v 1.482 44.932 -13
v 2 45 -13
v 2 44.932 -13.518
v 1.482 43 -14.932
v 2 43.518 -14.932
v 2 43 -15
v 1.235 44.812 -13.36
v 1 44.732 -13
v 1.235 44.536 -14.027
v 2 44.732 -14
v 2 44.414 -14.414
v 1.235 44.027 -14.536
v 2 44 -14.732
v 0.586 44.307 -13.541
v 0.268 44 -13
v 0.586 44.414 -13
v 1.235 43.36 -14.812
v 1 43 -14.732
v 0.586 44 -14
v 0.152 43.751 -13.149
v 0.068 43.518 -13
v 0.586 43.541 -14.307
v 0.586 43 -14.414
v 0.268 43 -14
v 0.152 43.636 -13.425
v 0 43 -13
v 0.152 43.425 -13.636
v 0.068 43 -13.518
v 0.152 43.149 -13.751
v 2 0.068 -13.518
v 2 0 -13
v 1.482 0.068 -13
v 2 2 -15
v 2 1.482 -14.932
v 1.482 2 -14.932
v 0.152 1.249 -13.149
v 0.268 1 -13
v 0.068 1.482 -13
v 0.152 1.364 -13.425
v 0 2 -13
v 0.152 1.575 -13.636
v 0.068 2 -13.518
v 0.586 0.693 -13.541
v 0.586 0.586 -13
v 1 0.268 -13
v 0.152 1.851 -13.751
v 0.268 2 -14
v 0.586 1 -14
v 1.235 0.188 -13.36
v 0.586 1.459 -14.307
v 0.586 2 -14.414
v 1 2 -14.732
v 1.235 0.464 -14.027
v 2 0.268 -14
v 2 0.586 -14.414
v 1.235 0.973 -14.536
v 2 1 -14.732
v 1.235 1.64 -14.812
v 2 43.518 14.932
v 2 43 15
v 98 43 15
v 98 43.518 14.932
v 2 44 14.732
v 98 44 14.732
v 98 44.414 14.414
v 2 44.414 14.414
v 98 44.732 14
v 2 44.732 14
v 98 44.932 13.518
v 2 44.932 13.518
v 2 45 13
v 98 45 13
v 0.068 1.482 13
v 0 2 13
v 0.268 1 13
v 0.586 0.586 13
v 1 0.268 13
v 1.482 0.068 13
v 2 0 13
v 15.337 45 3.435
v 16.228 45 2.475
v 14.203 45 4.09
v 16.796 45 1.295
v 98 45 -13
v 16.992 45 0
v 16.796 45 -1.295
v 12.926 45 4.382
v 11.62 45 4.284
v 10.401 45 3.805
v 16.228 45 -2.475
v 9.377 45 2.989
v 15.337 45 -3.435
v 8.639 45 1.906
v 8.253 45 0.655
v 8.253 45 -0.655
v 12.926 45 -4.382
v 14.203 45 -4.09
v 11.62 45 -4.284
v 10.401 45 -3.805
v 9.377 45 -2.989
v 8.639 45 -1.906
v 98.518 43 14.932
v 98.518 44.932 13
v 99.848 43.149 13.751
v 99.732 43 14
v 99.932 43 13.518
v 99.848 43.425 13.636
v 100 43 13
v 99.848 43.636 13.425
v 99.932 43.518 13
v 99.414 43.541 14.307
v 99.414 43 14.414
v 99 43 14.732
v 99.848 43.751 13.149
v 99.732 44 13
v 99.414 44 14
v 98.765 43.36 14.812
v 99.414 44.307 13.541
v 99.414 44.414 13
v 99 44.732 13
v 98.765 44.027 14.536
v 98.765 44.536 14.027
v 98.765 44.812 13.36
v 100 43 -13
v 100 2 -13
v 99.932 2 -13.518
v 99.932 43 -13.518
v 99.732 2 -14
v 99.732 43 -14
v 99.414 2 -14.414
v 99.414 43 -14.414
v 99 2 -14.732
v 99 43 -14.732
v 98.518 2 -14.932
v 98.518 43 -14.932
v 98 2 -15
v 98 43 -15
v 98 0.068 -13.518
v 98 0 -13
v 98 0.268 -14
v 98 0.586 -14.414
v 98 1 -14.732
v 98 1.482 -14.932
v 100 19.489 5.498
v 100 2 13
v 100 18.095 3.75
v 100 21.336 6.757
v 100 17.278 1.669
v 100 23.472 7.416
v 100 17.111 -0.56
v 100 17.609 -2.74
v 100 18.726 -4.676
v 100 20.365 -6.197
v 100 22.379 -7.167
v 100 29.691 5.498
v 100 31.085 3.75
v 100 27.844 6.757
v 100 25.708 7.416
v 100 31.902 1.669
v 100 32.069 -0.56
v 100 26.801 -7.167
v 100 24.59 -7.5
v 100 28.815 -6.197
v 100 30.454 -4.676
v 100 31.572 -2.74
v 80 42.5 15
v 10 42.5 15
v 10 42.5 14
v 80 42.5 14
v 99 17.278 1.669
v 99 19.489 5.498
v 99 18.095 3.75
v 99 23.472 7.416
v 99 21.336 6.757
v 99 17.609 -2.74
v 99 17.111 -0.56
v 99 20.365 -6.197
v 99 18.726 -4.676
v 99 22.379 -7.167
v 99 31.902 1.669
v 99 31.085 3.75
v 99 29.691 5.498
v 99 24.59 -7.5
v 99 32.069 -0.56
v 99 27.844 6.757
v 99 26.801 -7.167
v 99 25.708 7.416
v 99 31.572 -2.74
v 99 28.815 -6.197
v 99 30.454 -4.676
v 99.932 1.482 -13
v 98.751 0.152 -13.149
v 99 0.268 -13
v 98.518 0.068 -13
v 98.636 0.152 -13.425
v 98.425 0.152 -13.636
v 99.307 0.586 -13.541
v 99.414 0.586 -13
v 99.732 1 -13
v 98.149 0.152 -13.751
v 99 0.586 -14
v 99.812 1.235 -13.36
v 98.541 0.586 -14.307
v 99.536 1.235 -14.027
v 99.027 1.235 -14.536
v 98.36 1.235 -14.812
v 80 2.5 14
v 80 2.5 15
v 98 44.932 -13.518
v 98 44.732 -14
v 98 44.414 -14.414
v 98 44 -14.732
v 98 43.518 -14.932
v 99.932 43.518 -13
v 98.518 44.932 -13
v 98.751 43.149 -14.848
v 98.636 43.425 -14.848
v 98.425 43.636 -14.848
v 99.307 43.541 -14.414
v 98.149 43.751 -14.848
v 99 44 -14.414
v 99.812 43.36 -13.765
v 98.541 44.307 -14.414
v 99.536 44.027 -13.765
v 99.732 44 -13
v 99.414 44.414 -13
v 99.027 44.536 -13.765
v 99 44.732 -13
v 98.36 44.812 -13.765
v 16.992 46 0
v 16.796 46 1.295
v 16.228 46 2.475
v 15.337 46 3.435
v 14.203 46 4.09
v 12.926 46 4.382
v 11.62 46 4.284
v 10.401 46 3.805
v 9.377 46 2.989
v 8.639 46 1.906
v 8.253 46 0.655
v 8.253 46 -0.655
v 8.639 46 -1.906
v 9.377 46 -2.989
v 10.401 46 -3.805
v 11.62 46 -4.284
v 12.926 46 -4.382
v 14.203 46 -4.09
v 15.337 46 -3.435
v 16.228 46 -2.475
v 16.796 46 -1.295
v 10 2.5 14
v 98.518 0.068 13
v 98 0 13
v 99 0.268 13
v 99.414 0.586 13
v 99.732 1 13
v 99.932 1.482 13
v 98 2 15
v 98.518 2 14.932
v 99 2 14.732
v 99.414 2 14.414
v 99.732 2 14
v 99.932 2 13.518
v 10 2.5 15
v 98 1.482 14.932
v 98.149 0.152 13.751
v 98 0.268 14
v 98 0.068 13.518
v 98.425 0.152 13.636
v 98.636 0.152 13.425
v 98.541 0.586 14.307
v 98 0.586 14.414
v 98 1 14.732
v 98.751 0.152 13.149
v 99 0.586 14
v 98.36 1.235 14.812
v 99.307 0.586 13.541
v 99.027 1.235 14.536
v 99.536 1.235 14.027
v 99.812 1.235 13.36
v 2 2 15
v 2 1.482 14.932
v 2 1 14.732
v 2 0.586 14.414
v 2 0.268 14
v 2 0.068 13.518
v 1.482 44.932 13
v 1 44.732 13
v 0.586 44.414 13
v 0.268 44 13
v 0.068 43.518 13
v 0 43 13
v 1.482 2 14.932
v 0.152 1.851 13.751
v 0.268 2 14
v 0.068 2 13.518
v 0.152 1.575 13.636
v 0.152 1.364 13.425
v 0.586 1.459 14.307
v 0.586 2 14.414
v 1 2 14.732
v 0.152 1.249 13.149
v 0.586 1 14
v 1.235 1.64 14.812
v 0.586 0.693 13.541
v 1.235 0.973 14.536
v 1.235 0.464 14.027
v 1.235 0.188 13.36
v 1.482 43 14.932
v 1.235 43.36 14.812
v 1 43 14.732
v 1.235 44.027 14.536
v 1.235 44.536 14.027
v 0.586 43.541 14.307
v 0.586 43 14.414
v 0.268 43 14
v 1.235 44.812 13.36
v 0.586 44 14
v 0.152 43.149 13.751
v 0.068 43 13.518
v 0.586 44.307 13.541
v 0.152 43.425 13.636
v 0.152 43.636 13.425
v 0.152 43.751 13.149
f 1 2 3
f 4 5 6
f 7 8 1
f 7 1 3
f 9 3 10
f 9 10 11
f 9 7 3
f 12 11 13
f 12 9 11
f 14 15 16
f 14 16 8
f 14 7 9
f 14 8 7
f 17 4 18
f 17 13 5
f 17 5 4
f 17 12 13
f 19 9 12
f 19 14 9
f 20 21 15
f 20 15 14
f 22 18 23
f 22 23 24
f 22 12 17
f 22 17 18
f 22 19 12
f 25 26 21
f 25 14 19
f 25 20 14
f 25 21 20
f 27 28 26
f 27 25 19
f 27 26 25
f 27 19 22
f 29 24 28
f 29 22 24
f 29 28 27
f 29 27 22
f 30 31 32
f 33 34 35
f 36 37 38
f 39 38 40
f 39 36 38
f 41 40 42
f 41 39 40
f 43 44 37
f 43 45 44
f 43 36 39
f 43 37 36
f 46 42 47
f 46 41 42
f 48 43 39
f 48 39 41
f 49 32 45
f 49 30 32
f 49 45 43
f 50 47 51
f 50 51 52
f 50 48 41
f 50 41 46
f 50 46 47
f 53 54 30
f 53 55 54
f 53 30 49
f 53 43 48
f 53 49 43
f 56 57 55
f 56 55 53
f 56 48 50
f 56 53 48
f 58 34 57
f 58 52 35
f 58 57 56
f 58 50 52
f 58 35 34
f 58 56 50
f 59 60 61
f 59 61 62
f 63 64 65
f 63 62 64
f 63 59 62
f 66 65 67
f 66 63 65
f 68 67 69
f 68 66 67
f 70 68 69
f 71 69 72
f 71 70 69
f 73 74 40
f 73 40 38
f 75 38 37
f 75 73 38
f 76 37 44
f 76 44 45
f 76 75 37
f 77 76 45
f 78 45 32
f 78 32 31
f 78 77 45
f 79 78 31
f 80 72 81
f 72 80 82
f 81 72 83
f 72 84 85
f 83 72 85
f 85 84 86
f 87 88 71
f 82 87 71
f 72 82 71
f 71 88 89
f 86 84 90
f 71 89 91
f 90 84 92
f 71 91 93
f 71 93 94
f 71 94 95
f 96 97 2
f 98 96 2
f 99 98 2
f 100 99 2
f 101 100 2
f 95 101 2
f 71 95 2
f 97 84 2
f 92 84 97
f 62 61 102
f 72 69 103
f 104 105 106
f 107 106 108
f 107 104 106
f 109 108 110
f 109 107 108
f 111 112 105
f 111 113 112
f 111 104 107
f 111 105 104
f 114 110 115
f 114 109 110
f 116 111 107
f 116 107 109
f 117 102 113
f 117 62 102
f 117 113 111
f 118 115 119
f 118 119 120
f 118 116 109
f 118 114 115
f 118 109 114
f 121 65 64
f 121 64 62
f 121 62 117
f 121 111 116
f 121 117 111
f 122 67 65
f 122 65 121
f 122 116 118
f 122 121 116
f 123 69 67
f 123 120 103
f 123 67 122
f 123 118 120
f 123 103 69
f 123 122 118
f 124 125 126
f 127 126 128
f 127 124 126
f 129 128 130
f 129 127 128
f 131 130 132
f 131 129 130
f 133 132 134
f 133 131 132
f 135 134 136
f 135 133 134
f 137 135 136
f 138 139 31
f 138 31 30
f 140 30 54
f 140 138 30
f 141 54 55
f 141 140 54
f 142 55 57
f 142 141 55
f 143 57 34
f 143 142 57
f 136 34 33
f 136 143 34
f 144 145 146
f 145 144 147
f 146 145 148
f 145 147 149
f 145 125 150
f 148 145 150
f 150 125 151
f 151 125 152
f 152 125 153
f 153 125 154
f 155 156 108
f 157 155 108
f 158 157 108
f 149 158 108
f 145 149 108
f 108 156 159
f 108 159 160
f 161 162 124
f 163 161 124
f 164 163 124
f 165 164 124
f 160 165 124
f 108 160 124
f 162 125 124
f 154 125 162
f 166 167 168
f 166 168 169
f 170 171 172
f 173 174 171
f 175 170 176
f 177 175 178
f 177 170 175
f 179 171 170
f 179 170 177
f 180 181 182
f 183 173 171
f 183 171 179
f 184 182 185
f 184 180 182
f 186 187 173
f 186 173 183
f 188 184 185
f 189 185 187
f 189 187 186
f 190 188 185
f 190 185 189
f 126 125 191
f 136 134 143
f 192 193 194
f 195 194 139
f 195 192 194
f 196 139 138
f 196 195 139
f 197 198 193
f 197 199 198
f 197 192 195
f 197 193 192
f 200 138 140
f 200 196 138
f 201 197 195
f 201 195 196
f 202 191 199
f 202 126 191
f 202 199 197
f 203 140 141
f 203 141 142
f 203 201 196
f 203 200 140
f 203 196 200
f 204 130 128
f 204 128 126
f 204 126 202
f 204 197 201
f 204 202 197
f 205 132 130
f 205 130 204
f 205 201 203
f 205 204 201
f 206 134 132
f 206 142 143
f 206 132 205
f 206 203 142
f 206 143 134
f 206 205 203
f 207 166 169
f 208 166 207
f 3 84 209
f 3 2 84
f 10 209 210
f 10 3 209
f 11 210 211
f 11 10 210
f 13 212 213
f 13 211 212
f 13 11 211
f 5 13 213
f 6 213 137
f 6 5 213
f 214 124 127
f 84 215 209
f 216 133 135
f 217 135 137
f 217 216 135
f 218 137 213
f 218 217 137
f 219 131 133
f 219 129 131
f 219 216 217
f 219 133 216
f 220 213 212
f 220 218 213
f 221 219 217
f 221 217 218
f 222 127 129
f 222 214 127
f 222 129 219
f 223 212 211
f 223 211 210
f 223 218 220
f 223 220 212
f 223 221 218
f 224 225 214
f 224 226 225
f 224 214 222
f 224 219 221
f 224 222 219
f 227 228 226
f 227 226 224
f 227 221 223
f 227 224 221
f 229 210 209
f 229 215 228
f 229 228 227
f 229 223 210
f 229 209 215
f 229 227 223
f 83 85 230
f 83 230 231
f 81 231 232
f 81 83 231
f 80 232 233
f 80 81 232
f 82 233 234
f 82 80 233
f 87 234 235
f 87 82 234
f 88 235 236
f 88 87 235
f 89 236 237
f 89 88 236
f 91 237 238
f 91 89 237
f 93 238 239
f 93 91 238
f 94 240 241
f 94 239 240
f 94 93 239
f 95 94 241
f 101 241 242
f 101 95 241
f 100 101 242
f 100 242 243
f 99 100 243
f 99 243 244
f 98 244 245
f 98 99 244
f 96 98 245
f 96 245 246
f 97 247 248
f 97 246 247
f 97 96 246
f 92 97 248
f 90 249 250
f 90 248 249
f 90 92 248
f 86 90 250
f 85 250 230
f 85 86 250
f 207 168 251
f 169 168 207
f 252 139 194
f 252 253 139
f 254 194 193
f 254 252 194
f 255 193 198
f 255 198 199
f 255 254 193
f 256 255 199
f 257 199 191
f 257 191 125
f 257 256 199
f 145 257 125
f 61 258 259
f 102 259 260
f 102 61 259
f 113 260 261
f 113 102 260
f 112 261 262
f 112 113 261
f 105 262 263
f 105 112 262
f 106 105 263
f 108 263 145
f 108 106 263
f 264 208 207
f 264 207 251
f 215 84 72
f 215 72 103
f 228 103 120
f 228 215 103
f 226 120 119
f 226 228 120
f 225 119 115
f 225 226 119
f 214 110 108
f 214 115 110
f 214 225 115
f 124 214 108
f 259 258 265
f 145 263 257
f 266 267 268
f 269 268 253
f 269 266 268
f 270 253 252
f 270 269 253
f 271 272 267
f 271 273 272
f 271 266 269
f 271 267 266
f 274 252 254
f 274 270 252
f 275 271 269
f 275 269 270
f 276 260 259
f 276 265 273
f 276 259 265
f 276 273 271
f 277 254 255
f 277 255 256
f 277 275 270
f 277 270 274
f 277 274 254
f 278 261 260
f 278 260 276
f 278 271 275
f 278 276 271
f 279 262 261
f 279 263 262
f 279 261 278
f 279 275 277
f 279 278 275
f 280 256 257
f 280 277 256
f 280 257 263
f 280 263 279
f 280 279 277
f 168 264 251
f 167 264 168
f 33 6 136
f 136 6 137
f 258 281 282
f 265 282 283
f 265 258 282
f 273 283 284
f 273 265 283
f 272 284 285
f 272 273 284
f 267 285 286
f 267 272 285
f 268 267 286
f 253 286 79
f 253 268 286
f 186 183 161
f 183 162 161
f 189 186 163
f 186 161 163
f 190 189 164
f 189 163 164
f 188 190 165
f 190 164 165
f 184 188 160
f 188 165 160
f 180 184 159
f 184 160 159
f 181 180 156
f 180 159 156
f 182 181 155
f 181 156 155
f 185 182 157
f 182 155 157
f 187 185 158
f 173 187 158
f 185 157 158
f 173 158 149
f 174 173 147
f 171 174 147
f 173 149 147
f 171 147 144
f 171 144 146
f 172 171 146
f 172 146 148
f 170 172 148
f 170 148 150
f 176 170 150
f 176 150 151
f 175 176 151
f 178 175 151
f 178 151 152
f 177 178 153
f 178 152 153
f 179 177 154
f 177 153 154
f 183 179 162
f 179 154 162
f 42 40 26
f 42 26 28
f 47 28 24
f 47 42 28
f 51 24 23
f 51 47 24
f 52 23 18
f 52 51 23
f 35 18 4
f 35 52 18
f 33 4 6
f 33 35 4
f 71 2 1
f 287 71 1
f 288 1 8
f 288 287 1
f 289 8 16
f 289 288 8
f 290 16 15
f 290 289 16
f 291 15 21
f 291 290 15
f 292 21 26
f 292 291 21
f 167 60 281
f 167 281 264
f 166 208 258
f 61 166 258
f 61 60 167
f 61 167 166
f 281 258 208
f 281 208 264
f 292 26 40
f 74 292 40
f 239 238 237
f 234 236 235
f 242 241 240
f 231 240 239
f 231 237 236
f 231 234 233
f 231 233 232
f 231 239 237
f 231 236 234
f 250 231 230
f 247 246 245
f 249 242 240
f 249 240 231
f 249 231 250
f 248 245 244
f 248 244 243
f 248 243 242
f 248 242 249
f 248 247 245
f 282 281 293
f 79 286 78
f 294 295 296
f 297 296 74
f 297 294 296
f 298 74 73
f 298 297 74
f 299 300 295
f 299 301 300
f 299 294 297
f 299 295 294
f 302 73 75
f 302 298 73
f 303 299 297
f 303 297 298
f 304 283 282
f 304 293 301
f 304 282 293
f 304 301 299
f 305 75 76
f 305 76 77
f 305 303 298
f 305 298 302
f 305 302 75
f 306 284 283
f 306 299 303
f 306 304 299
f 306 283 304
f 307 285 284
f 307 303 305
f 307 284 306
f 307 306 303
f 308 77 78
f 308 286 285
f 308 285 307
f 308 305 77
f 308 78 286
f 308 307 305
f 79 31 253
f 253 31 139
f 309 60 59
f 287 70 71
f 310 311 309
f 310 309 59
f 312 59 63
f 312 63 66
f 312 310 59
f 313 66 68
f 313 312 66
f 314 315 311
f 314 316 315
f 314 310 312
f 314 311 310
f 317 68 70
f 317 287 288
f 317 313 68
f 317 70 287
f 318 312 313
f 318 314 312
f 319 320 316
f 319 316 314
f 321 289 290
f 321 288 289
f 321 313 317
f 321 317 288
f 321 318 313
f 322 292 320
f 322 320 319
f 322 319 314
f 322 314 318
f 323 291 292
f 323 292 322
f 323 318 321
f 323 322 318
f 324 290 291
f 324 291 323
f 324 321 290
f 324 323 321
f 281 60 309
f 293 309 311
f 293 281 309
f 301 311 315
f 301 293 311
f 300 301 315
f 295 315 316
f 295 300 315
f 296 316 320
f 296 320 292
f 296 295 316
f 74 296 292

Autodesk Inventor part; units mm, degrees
ref_plane "YZ Plane" through (0, 0, 0) normal (1, 0, 0) x (0, 1, 0)
ref_plane "XZ Plane" through (0, 0, 0) normal (0, 1, 0) x (-1, 0, 0)
ref_plane "XY Plane" through (0, 0, 0) normal (0, 0, 1) x (1, 0, 0)
sketch "스케치1" plane through (0, 0, 0) normal (0, 0, 1) x (1, 0, 0)
  line L0 (0, 0) -> (100, 0)
  line L1 (100, 0) -> (100, 45)
  line L2 (100, 45) -> (0, 45)
  line L3 (0, 45) -> (0, 0)
  dimension "d0" = 100
  dimension "d1" = 45
extrude "돌출1" add sketch "스케치1" along normal mid plane 30
sketch "스케치2" plane through (100, 0, 15) normal (1, 0, 0) x (0, 0, -1)
  circle A0 centre (15, 24.5901) radius 7.5
  point P0 (15, 0)
  dimension "d4" = 15
extrude "돌출2" cut sketch "스케치2" against normal blind 1
sketch "스케치3" plane through (0, 0, 15) normal (0, 0, 1) x (1, 0, 0)
  line L0 (10, 42.5) -> (80, 42.5)
  line L1 (80, 42.5) -> (80, 2.5)
  line L2 (80, 2.5) -> (10, 2.5)
  line L3 (10, 2.5) -> (10, 42.5)
  line L4 (100, 45) -> (0, 45) projected
  line L5 (0, 45) -> (0, 0) projected
  dimension "d7" = 70
  dimension "d8" = 40
  dimension "d9" = 2.5
  dimension "d10" = 10
extrude "돌출3" cut sketch "스케치3" against normal blind 1
sketch "스케치4" plane through (0, 0, 14) normal (0, 0, 1) x (1, 0, 0)
  line L0 (11.7603, 30.0874) -> (53.0164, 30.0874) construction
  line L1 (53.0164, 30.0874) -> (53.0164, 23.3337) construction
  line L2 (53.0164, 23.3337) -> (11.7603, 23.3337) construction
  line L3 (11.7603, 23.3337) -> (11.7603, 30.0874) construction
  point P0 (0, 0)
sketch "스케치5" plane through (99, 24.5901, 0) normal (1, 0, 0) x (0, 0, -1)
  line L0 (-5.91, 1.6766) -> (6.6648, 1.6766) construction
  line L1 (6.6648, 1.6766) -> (6.6648, -1.7518) construction
  line L2 (6.6648, -1.7518) -> (-5.91, -1.7518) construction
  line L3 (-5.91, -1.7518) -> (-5.91, 1.6766) construction
  point P0 (0, -24.5901)
sketch "스케치6" plane through (0, 45, 15) normal (0, 1, 0) x (1, 0, 0)
  circle A0 centre (12.5978, 15) radius 4.3939
  point P0 (0, 15)
extrude "돌출4" add sketch "스케치6" along normal blind 1
sketch "스케치7" plane through (12.5978, 46, 0) normal (0, 1, 0) x (1, 0, 0)
  line L0 (-4.0633, 1.8765) -> (4.3199, 1.8765) construction
  line L1 (4.3199, 1.8765) -> (4.3199, -1.5495) construction
  line L2 (4.3199, -1.5495) -> (-4.0633, -1.5495) construction
  line L3 (-4.0633, -1.5495) -> (-4.0633, 1.8765) construction
  point P0 (-12.5978, 0)
fillet "모깎기1" radius 2 11 edges at (50, 45, 15) (100, 45, 0) (100, 22.5, 15) (100, 22.5, -15) (50, 45, -15) (50, 0, -15) (50, 0, 15) (100, 0, 0) (0, 0, 0) (0, 22.5, 15) (0, 22.5, -15)
fillet "모깎기2" radius 2 3 edges at (0, 45, 0) (0.5858, 44.4142, 14.4142) (0.5858, 44.4142, -14.4142)
properties part number "구상도"
